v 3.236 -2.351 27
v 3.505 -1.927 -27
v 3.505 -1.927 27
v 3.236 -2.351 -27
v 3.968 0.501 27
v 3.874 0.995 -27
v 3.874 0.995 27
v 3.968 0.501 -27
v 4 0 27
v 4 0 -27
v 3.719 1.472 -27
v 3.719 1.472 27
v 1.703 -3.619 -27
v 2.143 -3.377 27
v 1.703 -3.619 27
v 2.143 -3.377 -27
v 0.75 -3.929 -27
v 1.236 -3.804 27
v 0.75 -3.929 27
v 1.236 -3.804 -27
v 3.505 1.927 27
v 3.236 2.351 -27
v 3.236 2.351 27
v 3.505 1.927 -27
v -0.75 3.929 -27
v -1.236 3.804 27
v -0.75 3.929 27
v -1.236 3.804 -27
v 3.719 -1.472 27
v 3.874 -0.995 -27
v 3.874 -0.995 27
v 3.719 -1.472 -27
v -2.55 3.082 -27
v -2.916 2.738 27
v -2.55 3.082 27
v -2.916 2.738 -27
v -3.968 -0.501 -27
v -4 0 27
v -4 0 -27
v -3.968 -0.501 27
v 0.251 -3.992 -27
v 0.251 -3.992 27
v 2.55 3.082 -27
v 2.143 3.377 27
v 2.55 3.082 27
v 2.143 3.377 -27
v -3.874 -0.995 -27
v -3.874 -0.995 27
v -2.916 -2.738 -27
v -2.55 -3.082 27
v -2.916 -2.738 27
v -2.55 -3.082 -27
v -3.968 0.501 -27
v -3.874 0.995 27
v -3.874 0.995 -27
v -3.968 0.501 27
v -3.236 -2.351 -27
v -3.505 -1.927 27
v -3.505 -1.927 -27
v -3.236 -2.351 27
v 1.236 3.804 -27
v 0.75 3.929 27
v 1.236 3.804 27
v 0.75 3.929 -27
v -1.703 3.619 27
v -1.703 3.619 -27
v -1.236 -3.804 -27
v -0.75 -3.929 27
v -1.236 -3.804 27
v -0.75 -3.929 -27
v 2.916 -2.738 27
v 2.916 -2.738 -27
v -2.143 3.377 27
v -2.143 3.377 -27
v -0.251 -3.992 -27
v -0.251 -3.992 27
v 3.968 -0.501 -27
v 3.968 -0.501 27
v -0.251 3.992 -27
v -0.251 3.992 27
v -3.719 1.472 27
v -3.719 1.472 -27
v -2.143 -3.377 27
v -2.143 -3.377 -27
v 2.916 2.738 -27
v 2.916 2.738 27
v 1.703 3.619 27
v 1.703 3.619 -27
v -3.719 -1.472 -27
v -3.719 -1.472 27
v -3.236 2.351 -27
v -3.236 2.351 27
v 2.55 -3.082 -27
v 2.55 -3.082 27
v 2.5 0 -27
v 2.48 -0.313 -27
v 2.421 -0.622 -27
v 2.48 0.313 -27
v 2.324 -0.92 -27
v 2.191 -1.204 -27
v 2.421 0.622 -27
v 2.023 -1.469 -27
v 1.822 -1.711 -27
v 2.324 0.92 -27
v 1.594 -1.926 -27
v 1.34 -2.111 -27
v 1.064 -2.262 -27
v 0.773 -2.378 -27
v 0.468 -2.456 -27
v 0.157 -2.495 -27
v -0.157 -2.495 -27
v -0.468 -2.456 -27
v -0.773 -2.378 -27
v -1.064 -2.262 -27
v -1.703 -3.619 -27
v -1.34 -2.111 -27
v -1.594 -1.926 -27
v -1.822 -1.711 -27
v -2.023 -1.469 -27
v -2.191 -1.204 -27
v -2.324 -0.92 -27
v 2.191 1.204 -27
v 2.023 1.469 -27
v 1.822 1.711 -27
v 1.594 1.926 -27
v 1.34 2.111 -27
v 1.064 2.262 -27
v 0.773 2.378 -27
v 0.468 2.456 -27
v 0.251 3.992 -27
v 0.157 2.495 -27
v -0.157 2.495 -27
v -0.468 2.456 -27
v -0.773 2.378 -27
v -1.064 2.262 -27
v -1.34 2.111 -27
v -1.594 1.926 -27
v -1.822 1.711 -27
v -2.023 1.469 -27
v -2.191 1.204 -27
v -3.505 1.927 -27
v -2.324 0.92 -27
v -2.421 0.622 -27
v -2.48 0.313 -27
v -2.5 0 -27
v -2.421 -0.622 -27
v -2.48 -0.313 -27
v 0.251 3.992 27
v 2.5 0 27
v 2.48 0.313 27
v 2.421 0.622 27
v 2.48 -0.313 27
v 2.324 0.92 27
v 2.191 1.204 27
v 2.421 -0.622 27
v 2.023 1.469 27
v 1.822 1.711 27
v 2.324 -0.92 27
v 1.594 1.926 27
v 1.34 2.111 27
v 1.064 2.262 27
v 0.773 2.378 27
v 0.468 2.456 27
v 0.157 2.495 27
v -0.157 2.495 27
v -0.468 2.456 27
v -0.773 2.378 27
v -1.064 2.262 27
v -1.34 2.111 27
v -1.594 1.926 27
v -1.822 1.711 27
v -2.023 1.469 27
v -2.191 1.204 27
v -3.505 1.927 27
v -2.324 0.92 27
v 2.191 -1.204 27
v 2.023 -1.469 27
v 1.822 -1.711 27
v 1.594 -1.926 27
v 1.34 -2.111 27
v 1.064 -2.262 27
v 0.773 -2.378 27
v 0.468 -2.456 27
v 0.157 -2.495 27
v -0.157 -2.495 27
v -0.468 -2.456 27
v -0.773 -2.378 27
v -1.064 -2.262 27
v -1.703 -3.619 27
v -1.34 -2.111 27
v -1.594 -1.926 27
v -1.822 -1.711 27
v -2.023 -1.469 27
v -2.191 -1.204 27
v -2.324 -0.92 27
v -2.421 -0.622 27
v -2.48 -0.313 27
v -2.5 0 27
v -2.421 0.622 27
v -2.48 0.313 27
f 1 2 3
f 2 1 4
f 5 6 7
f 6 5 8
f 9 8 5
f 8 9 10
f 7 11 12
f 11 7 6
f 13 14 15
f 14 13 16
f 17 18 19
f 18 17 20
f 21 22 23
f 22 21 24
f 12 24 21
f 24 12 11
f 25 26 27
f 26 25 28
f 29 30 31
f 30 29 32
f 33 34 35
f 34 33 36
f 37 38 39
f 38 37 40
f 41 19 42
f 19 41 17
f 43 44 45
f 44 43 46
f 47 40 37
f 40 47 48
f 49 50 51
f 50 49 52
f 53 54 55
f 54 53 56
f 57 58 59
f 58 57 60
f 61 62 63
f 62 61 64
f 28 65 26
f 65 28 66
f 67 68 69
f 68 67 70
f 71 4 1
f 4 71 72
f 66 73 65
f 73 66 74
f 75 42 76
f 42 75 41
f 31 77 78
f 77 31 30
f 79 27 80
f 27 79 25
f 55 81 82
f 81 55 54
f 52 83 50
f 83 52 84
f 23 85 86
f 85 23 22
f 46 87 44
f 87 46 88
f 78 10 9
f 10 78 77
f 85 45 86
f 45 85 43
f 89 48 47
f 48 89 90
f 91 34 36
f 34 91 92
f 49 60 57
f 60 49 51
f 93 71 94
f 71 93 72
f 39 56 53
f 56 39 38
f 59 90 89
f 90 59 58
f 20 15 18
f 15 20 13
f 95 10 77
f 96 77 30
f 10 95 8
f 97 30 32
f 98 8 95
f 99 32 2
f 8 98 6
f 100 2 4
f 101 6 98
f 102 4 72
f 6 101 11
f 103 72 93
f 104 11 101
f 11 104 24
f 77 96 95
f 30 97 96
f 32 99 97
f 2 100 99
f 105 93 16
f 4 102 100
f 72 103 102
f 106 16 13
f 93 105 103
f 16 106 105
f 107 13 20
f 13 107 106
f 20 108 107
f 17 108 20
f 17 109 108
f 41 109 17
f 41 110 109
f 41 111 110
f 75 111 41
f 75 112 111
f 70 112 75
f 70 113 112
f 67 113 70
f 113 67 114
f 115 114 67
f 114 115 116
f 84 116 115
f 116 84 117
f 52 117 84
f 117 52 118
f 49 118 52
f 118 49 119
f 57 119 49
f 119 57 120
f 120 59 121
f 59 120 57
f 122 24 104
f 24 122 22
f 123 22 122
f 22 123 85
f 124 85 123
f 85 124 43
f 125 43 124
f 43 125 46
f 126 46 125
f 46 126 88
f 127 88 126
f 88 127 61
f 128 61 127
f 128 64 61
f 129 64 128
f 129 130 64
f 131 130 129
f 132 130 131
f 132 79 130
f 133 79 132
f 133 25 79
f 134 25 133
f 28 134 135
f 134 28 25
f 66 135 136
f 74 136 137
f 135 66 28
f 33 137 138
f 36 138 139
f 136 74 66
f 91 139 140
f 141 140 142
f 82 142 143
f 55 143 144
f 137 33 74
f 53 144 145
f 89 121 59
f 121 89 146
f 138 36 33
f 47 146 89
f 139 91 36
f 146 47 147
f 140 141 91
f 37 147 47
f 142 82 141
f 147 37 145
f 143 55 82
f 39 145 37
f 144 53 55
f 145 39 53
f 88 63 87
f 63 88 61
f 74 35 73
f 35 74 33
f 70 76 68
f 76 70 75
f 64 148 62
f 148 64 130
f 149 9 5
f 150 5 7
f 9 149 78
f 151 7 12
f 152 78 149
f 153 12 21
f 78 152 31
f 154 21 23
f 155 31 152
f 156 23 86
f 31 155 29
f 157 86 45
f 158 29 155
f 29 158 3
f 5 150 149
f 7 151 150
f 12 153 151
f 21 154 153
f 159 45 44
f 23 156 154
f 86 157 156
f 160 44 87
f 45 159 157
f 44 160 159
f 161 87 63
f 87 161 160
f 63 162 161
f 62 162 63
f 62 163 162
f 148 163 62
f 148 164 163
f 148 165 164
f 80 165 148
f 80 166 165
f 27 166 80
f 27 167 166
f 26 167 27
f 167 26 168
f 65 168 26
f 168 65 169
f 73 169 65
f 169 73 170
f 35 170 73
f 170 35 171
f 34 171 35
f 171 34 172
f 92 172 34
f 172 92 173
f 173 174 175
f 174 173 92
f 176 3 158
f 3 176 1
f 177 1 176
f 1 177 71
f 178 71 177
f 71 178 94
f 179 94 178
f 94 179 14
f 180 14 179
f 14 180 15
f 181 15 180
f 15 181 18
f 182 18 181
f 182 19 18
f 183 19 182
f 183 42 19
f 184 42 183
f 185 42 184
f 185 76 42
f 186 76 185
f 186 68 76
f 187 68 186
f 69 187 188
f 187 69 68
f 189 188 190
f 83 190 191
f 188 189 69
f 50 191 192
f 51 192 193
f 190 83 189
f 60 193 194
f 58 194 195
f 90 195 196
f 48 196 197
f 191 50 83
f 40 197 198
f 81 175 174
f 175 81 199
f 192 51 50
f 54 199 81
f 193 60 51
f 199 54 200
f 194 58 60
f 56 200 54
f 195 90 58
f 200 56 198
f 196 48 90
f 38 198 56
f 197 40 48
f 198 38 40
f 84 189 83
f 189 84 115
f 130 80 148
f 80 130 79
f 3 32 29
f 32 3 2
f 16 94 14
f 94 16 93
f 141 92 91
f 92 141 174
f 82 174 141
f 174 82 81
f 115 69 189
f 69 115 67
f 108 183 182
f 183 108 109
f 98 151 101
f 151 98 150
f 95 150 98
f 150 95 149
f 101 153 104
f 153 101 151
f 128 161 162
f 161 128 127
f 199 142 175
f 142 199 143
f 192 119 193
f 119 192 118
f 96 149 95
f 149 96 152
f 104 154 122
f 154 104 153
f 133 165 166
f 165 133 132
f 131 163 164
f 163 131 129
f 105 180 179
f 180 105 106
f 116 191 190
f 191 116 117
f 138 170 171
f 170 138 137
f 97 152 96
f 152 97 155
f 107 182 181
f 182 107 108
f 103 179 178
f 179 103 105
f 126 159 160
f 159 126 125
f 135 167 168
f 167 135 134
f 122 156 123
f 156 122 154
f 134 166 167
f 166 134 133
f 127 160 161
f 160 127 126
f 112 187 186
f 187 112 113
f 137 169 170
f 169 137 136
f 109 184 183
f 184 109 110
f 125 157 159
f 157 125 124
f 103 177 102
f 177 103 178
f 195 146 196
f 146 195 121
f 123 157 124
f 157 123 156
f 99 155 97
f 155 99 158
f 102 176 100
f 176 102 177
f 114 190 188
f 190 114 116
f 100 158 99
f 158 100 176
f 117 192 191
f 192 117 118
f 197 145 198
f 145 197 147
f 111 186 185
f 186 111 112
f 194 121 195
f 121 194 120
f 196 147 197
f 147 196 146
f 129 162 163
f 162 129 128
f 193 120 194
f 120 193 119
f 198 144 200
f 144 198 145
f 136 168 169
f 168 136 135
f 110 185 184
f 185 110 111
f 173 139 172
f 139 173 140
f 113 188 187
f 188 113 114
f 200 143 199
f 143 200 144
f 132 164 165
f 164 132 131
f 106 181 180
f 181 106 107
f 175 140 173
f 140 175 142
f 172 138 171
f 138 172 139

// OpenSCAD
$fn = 50;


difference() {
	union() {
		translate(v = [0, 0, -27.0000000000]) {
			cylinder(h = 54, r = 4.0000000000);
		}
	}
	union() {
		translate(v = [0, 0, -100.0000000000]) {
			cylinder(h = 200, r = 2.5000000000);
		}
	}
}
